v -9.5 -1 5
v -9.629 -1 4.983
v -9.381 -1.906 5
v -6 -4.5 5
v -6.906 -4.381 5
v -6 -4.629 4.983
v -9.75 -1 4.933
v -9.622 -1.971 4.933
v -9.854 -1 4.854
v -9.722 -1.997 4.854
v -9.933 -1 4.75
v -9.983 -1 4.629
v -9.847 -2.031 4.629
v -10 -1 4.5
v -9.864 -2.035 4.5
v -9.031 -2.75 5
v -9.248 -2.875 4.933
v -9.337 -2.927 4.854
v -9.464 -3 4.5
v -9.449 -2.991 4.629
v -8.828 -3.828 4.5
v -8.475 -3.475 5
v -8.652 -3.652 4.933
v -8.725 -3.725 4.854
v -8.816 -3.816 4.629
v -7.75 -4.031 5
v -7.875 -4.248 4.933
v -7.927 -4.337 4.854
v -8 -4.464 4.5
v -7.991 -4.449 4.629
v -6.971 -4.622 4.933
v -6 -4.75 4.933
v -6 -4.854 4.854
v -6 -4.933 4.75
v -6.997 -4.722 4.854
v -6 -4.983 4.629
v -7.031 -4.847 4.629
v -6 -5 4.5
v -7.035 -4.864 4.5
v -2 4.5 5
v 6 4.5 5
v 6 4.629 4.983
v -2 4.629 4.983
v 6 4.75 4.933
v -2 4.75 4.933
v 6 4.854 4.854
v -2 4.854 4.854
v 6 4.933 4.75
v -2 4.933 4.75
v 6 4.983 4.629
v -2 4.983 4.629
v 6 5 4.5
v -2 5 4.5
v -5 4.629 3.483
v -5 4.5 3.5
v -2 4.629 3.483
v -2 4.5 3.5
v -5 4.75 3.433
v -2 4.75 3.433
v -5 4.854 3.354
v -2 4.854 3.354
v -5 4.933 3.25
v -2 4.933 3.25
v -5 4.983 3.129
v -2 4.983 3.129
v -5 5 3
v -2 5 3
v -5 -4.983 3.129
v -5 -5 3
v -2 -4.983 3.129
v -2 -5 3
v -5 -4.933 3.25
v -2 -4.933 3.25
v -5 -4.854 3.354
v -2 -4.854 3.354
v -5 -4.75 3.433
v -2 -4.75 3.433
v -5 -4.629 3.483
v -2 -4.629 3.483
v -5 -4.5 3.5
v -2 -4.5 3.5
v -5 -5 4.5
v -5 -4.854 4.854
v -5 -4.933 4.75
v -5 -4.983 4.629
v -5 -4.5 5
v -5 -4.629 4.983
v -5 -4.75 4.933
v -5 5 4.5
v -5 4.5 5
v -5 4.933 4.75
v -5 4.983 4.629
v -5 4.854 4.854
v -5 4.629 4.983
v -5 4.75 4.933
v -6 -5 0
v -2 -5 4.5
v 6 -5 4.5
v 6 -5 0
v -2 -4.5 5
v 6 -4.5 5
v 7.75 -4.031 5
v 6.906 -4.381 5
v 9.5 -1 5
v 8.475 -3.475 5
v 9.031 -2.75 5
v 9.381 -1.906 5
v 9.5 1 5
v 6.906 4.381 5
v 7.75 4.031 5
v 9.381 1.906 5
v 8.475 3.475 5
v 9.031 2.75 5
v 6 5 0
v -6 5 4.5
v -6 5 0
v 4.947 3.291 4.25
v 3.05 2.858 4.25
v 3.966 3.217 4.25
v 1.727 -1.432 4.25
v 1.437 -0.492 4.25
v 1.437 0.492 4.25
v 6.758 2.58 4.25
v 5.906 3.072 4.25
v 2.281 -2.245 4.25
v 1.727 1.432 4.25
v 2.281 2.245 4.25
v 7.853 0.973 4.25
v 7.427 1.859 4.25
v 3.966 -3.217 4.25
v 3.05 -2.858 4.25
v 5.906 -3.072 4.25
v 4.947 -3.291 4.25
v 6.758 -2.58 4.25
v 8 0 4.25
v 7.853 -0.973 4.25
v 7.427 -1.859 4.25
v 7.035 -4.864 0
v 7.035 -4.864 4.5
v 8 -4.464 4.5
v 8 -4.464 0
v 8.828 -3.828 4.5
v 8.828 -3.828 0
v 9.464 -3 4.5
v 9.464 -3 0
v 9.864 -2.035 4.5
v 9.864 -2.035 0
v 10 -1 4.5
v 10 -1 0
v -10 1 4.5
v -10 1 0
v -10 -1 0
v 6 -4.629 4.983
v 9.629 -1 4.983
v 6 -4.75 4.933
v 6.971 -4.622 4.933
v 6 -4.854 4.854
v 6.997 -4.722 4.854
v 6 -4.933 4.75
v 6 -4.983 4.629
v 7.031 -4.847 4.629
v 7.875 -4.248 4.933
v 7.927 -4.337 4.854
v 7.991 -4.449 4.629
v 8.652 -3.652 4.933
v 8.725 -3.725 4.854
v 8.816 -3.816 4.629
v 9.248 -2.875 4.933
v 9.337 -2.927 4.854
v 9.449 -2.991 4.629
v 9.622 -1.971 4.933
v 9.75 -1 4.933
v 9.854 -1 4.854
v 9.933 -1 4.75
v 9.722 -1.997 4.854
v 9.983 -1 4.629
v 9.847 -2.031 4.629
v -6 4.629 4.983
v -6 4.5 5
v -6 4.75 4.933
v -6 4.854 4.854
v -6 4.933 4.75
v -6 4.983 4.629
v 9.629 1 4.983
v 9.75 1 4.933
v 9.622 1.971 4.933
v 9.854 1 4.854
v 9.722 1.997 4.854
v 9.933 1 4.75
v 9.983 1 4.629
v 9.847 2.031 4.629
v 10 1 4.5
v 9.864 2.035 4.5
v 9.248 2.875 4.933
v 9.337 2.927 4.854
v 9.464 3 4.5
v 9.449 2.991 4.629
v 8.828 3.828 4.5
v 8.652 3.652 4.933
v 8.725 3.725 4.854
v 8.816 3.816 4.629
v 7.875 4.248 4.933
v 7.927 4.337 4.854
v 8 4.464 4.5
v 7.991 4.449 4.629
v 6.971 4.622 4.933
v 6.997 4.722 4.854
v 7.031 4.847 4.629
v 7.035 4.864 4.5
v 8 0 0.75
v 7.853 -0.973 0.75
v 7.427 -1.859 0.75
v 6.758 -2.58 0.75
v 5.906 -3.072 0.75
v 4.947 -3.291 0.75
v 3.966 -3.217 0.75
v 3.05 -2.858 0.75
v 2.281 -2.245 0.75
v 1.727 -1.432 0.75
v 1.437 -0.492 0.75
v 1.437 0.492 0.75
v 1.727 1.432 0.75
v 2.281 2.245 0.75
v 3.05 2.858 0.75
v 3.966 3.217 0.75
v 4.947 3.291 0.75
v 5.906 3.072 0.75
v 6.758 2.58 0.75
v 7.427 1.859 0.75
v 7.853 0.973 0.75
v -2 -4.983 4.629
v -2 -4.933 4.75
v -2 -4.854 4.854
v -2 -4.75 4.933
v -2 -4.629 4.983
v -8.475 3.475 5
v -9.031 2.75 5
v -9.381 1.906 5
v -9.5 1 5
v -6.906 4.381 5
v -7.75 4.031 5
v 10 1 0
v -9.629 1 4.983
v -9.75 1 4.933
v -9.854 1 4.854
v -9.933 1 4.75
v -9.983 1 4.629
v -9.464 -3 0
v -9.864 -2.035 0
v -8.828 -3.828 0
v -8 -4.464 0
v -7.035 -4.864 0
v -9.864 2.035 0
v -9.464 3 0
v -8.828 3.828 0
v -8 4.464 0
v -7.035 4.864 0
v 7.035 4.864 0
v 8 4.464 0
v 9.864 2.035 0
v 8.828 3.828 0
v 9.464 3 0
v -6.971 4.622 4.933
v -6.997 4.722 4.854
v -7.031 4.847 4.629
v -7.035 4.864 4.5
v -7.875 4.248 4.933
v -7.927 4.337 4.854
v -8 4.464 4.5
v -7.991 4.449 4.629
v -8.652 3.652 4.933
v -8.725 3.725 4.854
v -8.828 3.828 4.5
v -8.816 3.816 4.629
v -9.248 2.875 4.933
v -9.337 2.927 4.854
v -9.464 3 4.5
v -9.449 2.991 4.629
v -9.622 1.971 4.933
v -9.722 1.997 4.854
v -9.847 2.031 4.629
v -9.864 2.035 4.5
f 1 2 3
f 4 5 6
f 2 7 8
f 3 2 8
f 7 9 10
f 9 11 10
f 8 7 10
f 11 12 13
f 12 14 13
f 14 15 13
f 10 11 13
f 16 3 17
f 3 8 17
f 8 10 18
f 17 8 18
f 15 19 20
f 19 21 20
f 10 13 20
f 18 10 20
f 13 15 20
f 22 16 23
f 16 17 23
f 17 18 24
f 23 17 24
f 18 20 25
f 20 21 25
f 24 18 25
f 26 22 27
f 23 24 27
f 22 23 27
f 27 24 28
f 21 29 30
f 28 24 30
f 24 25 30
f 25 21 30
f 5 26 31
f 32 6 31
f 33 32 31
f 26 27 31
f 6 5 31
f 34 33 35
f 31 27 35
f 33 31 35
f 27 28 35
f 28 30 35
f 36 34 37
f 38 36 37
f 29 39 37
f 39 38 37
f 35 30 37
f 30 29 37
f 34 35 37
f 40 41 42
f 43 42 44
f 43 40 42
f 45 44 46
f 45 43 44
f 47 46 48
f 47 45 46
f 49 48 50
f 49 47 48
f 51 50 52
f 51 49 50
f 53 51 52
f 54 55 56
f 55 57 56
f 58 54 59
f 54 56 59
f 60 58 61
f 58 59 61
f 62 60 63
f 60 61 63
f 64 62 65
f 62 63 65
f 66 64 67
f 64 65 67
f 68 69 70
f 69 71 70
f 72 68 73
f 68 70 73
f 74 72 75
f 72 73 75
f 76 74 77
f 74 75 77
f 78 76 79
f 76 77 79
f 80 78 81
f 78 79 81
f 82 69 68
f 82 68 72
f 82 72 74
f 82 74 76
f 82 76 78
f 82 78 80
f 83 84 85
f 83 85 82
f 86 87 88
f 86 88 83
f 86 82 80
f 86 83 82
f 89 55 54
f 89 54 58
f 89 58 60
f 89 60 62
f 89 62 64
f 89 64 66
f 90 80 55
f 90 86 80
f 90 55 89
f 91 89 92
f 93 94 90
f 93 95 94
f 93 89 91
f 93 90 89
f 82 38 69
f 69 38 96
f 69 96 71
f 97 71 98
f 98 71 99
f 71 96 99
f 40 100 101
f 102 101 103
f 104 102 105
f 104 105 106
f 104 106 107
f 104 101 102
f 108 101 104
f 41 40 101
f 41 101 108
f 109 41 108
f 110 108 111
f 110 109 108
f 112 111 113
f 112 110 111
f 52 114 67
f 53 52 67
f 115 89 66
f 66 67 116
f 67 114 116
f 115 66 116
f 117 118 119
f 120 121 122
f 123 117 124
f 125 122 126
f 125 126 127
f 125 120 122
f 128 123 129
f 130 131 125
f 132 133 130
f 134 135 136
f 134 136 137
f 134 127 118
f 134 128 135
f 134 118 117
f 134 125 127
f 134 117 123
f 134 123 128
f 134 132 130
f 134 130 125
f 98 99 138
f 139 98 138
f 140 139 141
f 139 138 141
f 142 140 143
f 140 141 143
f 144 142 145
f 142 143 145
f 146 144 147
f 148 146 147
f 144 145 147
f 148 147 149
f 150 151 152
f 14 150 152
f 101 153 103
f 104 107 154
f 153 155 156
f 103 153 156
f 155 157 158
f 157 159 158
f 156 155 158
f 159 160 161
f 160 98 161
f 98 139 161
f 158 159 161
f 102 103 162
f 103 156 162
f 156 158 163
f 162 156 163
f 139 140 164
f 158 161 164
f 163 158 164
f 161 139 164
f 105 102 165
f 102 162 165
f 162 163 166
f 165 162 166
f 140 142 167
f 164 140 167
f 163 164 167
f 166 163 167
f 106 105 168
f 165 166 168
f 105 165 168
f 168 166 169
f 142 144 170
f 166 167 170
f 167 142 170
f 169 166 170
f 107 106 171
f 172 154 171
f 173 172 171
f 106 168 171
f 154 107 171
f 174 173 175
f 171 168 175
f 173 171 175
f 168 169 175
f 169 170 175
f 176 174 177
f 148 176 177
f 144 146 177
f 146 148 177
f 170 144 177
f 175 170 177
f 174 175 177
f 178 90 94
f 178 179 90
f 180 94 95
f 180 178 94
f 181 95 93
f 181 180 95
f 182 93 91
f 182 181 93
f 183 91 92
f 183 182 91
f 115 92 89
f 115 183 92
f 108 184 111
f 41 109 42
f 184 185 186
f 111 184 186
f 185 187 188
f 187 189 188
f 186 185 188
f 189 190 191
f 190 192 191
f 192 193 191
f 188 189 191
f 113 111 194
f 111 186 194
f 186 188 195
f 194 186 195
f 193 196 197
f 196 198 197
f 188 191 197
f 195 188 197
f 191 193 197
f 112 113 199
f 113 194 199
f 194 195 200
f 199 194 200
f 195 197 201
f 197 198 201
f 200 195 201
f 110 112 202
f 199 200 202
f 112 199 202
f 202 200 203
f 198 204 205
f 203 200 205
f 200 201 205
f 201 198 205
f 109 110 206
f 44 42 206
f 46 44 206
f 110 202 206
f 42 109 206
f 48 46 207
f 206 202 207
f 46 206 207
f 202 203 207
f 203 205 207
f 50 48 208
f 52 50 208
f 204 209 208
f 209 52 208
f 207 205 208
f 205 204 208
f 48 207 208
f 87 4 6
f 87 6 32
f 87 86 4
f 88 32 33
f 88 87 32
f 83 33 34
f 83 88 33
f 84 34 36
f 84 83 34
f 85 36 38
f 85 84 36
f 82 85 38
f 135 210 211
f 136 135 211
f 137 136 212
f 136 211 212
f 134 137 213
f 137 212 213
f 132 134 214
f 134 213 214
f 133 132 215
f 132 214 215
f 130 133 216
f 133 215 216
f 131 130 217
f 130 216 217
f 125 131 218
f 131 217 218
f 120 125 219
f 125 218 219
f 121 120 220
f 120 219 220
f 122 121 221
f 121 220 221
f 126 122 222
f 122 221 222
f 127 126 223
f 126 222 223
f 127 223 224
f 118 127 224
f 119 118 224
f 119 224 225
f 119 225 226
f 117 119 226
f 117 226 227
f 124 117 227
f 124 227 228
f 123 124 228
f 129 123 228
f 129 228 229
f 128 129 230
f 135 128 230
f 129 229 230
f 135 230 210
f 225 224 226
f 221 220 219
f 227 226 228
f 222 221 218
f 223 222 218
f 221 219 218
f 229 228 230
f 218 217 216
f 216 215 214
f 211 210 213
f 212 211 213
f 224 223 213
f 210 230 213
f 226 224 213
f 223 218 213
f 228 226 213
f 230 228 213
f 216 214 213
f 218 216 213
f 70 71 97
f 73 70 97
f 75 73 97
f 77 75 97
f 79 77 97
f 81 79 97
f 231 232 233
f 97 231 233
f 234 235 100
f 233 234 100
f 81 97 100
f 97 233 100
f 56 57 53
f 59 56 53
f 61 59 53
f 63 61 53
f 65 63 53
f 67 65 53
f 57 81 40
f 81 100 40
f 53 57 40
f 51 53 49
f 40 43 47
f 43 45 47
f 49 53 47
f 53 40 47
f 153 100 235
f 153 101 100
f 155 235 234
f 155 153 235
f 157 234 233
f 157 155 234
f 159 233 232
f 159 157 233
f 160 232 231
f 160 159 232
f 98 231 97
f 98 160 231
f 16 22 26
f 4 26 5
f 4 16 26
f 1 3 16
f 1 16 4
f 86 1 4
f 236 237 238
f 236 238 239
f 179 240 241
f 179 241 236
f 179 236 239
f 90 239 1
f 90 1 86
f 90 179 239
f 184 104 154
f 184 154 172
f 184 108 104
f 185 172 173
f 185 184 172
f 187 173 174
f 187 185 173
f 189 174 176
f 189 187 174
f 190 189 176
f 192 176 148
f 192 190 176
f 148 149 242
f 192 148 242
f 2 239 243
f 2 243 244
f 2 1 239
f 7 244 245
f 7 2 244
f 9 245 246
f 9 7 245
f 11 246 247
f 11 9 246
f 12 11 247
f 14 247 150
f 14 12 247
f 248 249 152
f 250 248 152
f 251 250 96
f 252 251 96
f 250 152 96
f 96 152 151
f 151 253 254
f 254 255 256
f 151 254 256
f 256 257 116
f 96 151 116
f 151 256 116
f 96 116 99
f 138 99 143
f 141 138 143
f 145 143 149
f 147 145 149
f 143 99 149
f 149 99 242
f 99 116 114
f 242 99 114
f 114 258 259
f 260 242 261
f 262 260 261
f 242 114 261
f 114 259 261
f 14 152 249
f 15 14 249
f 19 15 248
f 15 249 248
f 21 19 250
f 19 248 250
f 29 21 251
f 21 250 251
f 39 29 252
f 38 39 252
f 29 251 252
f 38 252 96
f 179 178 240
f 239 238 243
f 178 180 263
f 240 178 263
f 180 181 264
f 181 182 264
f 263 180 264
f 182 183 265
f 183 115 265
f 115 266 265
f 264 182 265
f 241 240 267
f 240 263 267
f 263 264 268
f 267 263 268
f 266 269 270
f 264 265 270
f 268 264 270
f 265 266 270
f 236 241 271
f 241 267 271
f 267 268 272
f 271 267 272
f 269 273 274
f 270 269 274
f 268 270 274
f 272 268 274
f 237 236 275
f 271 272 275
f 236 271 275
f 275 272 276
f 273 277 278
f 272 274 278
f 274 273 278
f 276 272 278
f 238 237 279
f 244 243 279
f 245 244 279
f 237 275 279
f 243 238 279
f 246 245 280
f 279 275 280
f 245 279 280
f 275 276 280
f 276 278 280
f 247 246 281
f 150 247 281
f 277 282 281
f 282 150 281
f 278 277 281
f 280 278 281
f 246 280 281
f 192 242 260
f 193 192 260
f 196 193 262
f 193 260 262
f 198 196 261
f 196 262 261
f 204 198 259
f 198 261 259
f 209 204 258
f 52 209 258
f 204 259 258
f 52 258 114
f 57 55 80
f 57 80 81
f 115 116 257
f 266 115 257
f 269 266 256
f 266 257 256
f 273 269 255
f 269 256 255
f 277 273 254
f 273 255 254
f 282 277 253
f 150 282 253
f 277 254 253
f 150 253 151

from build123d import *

# Parameters (mm, degrees)
F1_DEPTH = 5
F2_W     = 3
F2_H     = 10
F3_DEPTH = 1.5
F4_R     = 0.5
F6_START = -0.75
F5_R     = 3.3
F6_DEPTH = 3.5


# Not quite as in the source:
# - a feature names something its author has since deleted; it is built from what else it names


with BuildPart() as f1:
    # F0 (on Top) → F1 (new body)
    with BuildSketch(Plane.XY):
        with BuildLine():
            Line((-6, -5), (6, -5))
            ThreePointArc((6, -5), (8.8284271247, -3.8284271247), (10, -1))
            Line((10, -1), (10, 1))
            ThreePointArc((10, 1), (8.8284271247, 3.8284271247), (6, 5))
            Line((6, 5), (-6, 5))
            ThreePointArc((-6, 5), (-8.8284271247, 3.8284271247), (-10, 1))
            Line((-10, 1), (-10, -1))
            ThreePointArc((-10, -1), (-8.8284271247, -3.8284271247), (-6, -5))
        make_face()
    extrude(amount=F1_DEPTH)

    # F2 (on face) → F3 (cut)
    with BuildSketch(Plane.XY.offset(5)):
        with Locations((-3.5, 0)):
            Rectangle(F2_W, F2_H)
    extrude(amount=-F3_DEPTH, mode=Mode.SUBTRACT)

    # F4
    f4_edges = [f1.edges().sort_by_distance(p)[0] for p in [
        (-3.5, -5, 3.5),
        (-3.5, 5, 3.5),
        (2, 5, 5),
        (2, -5, 5),
        (-10, 0, 5),
        (-8.828427, 3.828427, 5),
        (-8.828427, -3.828427, 5),
        (-5.5, 5, 5),
        (-5.5, -5, 5),
        (8.828427, -3.828427, 5),
        (10, 0, 5),
        (8.828427, 3.828427, 5),
    ]]
    fillet(f4_edges, radius=F4_R)

    # F5 (on face) → F6 (cut)
    with BuildSketch(Plane(origin=(0, 0, 0), x_dir=(1, 0, 0), z_dir=(0, 0, -1)).offset(F6_START)):
        with Locations((4.7, 0)):
            Circle(F5_R)
    extrude(amount=-F6_DEPTH, mode=Mode.SUBTRACT)


solid = f1.part
